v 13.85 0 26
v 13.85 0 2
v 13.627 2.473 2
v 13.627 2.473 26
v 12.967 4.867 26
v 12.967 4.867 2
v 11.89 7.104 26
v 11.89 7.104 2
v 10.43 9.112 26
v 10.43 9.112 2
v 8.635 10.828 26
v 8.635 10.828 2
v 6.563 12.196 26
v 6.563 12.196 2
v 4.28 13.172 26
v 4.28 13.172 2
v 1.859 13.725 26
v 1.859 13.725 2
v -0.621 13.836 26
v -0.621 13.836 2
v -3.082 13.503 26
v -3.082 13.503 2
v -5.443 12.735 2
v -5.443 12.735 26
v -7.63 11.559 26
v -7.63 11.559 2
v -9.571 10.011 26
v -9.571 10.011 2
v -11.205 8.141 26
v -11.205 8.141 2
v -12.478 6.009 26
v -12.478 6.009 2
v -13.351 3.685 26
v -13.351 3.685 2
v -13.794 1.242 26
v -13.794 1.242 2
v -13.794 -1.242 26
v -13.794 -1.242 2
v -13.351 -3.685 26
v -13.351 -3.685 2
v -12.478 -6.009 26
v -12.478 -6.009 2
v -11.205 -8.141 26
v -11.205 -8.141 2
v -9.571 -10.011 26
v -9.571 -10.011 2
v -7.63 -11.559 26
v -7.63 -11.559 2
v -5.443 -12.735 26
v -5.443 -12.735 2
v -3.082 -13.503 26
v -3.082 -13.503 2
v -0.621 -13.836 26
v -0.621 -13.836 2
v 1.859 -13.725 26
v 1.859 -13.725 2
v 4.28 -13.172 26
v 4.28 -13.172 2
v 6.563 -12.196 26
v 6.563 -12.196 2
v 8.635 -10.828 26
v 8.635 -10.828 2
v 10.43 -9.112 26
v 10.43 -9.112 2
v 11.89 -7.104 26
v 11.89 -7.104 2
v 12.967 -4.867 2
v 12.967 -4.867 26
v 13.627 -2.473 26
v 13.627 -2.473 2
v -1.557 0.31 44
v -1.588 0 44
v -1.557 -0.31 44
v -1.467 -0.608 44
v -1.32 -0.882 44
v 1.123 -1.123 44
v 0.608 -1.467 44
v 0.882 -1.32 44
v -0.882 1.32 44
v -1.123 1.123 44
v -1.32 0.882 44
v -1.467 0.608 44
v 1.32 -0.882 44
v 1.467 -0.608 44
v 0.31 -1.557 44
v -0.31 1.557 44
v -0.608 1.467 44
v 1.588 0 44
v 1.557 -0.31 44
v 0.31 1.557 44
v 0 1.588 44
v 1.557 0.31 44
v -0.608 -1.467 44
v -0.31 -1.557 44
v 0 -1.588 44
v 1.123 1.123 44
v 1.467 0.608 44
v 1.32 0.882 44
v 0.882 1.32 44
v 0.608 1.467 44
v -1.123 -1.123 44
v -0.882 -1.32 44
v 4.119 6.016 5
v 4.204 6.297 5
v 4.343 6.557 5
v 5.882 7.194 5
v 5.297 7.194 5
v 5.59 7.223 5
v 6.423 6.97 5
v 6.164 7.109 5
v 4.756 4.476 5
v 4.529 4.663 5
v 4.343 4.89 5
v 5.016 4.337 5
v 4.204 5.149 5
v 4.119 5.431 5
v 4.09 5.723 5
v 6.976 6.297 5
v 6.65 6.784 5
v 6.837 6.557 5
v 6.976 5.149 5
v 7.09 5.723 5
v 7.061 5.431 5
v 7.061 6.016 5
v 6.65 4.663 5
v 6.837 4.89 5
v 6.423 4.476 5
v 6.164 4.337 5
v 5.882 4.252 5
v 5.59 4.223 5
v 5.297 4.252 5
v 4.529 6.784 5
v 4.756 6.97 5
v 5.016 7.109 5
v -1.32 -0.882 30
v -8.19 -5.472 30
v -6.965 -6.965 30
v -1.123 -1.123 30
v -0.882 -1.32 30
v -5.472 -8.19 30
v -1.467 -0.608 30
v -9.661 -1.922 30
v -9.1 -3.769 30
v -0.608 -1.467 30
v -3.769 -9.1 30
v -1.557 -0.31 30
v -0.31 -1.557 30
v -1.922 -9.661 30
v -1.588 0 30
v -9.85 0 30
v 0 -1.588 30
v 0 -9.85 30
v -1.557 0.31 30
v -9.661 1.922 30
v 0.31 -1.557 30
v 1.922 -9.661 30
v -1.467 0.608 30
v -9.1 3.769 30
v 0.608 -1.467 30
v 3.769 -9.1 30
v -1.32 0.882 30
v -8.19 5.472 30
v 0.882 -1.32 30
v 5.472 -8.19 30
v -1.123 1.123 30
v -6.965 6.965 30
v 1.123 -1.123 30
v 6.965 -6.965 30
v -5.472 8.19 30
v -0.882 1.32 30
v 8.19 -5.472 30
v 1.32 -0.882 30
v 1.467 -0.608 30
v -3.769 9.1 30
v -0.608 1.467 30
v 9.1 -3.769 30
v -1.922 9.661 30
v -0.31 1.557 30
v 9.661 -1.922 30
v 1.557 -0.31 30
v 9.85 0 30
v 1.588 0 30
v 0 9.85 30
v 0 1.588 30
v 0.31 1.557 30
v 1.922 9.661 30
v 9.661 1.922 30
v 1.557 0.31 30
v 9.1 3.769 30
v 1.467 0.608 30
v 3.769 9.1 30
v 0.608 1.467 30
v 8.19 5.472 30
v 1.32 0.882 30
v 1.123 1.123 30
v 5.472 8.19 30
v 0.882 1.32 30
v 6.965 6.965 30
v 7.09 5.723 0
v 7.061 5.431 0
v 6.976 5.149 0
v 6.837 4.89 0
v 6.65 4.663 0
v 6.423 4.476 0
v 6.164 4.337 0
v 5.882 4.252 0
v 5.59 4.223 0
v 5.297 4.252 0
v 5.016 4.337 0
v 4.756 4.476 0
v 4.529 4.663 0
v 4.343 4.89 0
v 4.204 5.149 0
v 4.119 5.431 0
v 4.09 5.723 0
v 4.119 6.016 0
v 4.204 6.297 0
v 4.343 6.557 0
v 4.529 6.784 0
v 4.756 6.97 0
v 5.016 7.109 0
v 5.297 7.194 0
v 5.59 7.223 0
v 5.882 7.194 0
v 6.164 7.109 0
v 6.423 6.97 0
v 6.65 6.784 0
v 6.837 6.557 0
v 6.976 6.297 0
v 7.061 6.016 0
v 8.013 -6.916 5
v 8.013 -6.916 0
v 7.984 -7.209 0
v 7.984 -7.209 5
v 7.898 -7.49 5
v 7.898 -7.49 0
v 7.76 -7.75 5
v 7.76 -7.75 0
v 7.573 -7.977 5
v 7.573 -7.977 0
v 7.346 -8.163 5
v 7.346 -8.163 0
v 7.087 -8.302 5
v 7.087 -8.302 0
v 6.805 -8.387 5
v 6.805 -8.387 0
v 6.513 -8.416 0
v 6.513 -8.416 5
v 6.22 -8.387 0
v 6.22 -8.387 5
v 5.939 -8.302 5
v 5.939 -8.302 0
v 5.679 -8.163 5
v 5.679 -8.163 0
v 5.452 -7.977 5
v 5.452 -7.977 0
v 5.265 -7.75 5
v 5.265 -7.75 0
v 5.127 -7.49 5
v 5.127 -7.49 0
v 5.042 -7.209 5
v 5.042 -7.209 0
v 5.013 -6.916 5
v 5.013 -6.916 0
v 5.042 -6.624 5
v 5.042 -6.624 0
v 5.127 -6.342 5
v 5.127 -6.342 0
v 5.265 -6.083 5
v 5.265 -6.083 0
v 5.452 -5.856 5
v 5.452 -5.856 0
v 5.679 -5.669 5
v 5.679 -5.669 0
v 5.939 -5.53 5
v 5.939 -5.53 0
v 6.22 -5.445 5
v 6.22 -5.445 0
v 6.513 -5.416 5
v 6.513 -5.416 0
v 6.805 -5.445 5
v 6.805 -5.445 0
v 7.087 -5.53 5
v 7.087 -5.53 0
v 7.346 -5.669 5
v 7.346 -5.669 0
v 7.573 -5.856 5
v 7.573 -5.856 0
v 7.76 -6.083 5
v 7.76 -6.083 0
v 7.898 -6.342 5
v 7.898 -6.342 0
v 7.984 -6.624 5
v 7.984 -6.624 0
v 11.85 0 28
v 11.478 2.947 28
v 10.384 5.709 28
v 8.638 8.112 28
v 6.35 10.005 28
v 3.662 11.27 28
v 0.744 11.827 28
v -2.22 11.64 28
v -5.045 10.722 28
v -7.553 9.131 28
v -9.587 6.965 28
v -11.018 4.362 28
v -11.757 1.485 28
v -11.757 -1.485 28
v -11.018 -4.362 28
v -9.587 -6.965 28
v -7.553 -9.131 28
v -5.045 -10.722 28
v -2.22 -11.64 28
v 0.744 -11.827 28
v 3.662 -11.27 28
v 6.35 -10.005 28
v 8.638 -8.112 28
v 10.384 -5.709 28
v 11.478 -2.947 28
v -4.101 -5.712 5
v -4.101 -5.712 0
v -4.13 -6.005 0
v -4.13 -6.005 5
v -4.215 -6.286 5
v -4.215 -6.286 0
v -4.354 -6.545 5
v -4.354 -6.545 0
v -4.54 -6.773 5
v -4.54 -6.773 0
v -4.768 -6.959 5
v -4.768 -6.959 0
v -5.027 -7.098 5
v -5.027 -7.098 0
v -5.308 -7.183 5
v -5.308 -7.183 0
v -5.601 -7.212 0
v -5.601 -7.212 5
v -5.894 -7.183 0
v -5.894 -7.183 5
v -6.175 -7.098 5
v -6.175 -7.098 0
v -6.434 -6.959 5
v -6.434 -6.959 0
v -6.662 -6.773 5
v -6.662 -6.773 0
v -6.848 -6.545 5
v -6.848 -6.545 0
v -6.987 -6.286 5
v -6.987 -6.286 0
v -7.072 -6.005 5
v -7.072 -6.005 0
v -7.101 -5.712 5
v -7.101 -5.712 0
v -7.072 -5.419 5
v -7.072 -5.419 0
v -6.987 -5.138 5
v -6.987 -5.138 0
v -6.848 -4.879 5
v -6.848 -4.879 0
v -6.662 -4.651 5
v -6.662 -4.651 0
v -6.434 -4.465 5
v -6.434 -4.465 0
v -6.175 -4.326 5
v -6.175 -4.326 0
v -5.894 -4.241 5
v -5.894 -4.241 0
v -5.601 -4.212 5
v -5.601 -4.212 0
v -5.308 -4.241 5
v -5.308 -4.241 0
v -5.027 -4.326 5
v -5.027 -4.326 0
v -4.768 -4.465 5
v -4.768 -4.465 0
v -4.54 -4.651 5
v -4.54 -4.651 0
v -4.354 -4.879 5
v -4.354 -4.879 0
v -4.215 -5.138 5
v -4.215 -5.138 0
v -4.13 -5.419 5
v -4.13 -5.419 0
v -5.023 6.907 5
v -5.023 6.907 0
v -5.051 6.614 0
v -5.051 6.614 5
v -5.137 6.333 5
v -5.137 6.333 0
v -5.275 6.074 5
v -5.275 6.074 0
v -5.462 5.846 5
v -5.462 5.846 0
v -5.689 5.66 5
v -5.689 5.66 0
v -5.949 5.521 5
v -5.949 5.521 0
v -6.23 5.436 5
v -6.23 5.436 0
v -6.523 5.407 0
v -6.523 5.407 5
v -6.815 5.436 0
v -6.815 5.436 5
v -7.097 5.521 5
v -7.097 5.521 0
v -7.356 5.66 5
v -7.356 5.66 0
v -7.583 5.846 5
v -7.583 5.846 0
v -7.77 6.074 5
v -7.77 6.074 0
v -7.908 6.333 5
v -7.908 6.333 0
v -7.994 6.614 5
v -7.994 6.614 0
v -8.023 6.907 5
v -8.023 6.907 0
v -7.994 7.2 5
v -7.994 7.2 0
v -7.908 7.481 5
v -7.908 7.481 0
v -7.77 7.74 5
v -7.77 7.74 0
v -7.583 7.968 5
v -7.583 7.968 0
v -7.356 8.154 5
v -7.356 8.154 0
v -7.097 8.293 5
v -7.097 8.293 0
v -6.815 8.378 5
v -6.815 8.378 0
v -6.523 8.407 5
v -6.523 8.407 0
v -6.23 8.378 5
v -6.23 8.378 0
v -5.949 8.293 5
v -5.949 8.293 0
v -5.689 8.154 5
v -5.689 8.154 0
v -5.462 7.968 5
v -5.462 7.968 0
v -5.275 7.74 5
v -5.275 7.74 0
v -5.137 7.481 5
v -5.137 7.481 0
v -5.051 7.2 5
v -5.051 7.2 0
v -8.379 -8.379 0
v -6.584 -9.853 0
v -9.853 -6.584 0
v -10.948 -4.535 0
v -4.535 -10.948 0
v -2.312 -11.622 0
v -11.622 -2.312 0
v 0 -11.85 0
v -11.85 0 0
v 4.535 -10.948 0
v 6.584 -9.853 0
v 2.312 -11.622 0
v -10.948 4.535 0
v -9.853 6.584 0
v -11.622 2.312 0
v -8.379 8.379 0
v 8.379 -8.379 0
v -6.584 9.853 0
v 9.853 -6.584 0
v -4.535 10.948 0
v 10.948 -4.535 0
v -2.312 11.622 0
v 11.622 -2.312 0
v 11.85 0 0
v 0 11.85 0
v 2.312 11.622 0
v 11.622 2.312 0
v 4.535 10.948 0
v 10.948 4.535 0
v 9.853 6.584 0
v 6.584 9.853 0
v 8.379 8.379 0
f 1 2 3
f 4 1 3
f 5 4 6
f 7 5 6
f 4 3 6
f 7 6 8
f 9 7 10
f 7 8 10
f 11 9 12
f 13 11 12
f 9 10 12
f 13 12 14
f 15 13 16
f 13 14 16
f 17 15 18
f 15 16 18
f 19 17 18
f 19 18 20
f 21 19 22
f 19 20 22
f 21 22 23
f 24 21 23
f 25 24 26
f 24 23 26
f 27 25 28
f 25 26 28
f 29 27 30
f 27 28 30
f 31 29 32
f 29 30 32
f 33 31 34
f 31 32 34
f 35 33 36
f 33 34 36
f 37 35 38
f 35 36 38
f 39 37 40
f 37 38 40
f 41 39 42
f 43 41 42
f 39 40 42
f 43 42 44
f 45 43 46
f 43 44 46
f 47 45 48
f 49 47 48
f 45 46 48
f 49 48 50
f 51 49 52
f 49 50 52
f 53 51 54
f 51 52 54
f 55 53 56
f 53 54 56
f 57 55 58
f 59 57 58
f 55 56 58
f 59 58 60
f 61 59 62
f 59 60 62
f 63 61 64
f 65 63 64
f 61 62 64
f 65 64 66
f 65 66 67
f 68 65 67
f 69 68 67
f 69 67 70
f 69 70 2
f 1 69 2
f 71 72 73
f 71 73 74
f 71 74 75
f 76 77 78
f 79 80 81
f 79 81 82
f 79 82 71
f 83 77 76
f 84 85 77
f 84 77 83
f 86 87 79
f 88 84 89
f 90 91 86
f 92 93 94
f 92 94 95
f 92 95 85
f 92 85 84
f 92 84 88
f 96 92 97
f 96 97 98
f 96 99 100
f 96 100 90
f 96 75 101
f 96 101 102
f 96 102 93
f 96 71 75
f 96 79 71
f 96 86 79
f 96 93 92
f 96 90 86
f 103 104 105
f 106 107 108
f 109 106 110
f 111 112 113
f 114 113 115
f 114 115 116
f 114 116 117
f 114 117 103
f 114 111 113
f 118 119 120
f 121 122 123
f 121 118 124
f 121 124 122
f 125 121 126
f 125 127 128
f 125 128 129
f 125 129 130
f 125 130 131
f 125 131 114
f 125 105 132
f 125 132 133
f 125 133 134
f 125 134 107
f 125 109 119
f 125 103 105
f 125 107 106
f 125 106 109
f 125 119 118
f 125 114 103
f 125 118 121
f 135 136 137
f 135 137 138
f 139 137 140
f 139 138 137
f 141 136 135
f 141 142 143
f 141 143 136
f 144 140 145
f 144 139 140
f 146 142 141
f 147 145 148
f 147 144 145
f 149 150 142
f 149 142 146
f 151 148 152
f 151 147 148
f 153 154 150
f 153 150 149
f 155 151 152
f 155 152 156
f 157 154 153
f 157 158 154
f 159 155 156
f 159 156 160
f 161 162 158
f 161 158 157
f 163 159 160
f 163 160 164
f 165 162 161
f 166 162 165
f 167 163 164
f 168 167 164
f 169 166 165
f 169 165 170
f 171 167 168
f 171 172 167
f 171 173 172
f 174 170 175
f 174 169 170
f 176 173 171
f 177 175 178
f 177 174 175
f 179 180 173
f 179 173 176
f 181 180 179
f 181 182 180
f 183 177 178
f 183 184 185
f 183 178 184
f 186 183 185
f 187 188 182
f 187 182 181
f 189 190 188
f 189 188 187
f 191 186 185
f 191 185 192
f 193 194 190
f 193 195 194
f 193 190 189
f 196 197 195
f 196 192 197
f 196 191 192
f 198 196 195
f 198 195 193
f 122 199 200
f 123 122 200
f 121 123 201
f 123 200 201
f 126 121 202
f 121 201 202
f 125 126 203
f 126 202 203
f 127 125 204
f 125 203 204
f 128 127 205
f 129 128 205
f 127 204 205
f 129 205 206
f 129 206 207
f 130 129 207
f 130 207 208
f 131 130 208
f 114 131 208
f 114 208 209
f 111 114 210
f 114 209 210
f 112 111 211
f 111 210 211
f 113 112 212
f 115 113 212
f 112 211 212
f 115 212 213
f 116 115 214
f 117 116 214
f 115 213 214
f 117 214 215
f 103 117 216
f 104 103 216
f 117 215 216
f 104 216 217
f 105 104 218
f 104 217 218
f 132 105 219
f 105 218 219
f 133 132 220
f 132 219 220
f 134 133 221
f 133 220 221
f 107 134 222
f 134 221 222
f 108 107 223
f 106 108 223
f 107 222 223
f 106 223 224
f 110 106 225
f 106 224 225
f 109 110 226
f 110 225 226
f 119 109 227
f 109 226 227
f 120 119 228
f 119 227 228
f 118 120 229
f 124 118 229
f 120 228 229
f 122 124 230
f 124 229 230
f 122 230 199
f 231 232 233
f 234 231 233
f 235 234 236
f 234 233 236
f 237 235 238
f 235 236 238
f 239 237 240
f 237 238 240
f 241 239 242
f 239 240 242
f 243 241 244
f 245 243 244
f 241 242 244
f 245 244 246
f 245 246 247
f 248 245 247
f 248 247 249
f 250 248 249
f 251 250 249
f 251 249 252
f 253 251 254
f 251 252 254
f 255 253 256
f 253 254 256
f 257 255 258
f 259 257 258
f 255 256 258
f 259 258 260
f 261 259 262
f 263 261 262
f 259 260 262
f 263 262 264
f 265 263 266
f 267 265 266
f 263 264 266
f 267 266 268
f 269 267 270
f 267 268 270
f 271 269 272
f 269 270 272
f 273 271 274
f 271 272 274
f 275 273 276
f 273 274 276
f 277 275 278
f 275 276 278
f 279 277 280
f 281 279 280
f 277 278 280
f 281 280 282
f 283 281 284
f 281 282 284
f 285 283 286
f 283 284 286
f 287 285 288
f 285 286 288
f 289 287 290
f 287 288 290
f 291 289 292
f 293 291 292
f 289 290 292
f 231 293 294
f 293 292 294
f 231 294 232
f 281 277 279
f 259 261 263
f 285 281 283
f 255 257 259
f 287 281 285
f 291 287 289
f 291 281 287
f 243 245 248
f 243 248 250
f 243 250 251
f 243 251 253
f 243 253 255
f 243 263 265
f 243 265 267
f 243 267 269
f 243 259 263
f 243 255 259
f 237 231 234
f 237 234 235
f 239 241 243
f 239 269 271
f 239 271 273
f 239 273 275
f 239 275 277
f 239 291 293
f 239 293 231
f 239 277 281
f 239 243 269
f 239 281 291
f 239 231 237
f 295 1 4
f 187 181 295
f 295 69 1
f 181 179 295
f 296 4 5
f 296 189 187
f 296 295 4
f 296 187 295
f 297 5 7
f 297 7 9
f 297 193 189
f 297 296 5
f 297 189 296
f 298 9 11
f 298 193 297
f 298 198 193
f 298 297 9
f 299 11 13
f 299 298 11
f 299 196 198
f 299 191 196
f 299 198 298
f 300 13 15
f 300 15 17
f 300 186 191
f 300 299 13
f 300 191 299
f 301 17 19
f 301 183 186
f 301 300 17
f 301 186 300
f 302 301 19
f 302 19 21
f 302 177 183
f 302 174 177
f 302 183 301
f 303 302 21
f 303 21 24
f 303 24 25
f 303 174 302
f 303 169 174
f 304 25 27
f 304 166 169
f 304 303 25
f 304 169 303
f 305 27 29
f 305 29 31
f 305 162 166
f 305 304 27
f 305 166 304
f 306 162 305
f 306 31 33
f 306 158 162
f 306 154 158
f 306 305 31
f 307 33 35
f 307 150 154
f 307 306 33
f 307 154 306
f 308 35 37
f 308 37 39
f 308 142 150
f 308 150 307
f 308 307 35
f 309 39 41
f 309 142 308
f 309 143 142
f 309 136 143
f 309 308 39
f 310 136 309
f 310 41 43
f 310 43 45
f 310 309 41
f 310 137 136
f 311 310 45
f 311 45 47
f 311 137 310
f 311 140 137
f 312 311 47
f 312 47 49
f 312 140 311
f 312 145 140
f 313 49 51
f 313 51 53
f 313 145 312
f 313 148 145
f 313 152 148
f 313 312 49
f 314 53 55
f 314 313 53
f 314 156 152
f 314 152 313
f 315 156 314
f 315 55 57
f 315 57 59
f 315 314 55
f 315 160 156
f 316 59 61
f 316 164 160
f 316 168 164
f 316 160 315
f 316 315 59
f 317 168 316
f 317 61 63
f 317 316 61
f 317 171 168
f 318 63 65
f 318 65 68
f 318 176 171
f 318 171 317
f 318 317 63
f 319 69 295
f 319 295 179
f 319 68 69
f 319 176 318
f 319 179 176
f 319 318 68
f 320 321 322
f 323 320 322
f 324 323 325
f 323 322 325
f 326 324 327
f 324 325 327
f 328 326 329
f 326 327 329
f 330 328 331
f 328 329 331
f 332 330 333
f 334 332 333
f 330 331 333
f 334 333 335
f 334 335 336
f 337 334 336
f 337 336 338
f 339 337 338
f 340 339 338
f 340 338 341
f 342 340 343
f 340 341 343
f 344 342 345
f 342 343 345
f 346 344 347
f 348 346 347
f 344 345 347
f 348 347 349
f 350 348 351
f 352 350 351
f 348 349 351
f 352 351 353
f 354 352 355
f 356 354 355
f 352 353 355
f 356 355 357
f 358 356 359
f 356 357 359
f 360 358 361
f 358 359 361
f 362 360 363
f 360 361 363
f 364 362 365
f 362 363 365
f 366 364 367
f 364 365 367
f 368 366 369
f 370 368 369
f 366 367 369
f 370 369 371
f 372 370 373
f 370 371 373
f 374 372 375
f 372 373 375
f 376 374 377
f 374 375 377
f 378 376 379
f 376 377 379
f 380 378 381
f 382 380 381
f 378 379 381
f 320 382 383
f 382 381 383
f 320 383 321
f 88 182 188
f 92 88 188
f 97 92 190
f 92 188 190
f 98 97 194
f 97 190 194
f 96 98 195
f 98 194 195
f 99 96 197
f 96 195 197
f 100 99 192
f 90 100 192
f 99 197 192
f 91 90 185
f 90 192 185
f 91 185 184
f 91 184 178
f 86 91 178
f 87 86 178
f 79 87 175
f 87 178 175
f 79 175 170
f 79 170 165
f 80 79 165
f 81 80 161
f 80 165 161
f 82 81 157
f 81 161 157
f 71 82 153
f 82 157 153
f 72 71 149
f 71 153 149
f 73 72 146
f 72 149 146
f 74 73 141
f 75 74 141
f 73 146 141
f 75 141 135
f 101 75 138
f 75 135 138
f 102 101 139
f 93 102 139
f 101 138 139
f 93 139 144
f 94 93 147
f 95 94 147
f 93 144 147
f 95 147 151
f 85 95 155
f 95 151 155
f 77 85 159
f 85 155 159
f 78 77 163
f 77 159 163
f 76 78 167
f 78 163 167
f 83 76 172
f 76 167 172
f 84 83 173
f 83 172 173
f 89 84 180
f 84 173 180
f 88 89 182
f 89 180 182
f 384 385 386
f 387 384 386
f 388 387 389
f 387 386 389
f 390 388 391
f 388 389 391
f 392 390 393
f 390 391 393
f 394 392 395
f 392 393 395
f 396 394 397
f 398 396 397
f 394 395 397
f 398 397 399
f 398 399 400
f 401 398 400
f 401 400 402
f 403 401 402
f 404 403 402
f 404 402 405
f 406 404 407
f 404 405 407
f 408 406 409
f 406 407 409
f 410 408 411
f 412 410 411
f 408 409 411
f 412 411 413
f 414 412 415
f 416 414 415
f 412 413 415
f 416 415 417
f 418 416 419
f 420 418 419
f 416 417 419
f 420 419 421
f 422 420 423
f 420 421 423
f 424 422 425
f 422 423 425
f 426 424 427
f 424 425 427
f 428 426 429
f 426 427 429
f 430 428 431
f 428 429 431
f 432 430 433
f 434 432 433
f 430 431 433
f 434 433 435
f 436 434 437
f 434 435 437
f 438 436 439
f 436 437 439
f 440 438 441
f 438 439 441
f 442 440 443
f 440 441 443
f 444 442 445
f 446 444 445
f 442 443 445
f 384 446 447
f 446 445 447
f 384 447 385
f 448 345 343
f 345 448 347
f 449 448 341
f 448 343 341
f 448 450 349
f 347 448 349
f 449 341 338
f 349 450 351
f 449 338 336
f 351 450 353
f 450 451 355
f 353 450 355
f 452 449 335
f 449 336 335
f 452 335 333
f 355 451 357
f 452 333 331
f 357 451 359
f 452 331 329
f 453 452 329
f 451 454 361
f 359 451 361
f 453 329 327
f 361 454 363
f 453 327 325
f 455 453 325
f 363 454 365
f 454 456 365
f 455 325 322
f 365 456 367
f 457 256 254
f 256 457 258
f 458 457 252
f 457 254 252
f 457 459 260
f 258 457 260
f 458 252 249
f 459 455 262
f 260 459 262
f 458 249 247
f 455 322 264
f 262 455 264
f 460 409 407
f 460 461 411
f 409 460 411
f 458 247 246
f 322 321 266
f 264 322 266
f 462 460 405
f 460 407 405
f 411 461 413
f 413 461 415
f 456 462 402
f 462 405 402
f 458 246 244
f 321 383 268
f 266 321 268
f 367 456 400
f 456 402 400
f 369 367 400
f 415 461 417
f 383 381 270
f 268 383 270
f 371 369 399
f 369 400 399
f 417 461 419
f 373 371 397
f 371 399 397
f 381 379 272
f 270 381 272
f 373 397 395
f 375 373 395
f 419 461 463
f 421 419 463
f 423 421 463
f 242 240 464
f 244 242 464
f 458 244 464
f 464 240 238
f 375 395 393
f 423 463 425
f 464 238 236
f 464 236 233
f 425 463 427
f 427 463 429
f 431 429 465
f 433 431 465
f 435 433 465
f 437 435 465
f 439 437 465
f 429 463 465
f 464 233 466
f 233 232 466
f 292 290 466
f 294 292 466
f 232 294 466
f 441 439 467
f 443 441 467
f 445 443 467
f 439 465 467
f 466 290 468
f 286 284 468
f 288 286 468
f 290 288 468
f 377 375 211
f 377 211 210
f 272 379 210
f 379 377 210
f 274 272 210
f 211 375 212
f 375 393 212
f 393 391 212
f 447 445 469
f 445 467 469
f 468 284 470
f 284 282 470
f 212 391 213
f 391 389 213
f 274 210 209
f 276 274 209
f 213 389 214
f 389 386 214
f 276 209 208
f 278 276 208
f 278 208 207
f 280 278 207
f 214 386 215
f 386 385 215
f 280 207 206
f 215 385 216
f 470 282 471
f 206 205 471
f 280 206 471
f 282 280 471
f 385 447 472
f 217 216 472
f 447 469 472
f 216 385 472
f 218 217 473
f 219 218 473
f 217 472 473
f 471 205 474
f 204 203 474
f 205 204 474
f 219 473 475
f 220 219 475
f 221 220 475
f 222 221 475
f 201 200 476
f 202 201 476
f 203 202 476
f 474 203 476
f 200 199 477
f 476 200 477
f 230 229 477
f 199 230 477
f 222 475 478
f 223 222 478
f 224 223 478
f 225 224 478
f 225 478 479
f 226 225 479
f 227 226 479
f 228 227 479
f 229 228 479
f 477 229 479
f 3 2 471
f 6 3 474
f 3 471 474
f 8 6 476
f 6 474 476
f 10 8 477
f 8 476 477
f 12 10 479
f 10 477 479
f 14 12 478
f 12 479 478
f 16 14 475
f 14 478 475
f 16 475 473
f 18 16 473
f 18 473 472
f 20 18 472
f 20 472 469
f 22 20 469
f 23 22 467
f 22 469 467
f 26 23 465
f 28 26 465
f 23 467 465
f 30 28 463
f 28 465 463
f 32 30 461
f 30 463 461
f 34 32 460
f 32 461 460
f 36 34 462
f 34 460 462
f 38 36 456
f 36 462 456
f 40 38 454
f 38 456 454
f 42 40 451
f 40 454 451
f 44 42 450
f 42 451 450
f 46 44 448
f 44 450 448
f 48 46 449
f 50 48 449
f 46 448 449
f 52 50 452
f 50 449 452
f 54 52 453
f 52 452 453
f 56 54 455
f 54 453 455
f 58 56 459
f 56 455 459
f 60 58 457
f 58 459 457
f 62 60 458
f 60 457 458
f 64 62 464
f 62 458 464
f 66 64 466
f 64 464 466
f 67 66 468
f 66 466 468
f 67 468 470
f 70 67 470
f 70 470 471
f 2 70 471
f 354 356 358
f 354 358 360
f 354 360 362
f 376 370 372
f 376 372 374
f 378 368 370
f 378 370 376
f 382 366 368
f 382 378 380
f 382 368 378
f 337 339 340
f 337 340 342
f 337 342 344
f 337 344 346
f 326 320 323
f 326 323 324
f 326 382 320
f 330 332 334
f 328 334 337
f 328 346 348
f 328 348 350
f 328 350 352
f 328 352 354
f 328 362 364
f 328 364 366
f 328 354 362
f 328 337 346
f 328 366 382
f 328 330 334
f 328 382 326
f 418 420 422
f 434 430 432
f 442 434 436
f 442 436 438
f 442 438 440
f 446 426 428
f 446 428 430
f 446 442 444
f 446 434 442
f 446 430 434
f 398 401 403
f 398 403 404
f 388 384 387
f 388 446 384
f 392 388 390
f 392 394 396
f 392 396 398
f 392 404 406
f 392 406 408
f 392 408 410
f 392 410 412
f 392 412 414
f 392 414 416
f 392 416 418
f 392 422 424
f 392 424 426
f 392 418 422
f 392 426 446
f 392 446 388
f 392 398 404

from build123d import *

# Parameters (mm, degrees)
F0_R     = 13.85
F1_DEPTH = 30
F2_SIZE  = 4
F3_R     = 1.5875
F4_DEPTH = 14
F5_SIZE  = 2
F6_R     = 1.5
F7_DEPTH = 5


with BuildPart() as f1:
    # F0 (on Top) → F1 (new body)
    with BuildSketch(Plane.XY):
        Circle(F0_R)
    extrude(amount=F1_DEPTH)

    # F2
    f2_edges = [f1.edges().sort_by_distance(p)[0] for p in [
        (-13.85, 0, 30),
    ]]
    chamfer(f2_edges, length=F2_SIZE)

    # F3 (on face) → F4 (join)
    with BuildSketch(Plane.XY.offset(30)):
        Circle(F3_R)
    extrude(amount=F4_DEPTH)

    # F5
    f5_edges = [f1.edges().sort_by_distance(p)[0] for p in [
        (-13.85, 0, 0),
    ]]
    chamfer(f5_edges, length=F5_SIZE)

    # F6 (on face) → F7 (cut)
    with BuildSketch(Plane(origin=(0, 0, 0), x_dir=(1, 0, 0), z_dir=(0, 0, -1))):
        with Locations((5.58971, -5.723211)):
            Circle(F6_R)
        with Locations((6.512679, 6.916286)):
            Circle(F6_R)
        with Locations((-5.601047, 5.712127)):
            Circle(F6_R)
        with Locations((-6.522529, -6.907005)):
            Circle(F6_R)
    extrude(amount=-F7_DEPTH, mode=Mode.SUBTRACT)


solid = f1.part
